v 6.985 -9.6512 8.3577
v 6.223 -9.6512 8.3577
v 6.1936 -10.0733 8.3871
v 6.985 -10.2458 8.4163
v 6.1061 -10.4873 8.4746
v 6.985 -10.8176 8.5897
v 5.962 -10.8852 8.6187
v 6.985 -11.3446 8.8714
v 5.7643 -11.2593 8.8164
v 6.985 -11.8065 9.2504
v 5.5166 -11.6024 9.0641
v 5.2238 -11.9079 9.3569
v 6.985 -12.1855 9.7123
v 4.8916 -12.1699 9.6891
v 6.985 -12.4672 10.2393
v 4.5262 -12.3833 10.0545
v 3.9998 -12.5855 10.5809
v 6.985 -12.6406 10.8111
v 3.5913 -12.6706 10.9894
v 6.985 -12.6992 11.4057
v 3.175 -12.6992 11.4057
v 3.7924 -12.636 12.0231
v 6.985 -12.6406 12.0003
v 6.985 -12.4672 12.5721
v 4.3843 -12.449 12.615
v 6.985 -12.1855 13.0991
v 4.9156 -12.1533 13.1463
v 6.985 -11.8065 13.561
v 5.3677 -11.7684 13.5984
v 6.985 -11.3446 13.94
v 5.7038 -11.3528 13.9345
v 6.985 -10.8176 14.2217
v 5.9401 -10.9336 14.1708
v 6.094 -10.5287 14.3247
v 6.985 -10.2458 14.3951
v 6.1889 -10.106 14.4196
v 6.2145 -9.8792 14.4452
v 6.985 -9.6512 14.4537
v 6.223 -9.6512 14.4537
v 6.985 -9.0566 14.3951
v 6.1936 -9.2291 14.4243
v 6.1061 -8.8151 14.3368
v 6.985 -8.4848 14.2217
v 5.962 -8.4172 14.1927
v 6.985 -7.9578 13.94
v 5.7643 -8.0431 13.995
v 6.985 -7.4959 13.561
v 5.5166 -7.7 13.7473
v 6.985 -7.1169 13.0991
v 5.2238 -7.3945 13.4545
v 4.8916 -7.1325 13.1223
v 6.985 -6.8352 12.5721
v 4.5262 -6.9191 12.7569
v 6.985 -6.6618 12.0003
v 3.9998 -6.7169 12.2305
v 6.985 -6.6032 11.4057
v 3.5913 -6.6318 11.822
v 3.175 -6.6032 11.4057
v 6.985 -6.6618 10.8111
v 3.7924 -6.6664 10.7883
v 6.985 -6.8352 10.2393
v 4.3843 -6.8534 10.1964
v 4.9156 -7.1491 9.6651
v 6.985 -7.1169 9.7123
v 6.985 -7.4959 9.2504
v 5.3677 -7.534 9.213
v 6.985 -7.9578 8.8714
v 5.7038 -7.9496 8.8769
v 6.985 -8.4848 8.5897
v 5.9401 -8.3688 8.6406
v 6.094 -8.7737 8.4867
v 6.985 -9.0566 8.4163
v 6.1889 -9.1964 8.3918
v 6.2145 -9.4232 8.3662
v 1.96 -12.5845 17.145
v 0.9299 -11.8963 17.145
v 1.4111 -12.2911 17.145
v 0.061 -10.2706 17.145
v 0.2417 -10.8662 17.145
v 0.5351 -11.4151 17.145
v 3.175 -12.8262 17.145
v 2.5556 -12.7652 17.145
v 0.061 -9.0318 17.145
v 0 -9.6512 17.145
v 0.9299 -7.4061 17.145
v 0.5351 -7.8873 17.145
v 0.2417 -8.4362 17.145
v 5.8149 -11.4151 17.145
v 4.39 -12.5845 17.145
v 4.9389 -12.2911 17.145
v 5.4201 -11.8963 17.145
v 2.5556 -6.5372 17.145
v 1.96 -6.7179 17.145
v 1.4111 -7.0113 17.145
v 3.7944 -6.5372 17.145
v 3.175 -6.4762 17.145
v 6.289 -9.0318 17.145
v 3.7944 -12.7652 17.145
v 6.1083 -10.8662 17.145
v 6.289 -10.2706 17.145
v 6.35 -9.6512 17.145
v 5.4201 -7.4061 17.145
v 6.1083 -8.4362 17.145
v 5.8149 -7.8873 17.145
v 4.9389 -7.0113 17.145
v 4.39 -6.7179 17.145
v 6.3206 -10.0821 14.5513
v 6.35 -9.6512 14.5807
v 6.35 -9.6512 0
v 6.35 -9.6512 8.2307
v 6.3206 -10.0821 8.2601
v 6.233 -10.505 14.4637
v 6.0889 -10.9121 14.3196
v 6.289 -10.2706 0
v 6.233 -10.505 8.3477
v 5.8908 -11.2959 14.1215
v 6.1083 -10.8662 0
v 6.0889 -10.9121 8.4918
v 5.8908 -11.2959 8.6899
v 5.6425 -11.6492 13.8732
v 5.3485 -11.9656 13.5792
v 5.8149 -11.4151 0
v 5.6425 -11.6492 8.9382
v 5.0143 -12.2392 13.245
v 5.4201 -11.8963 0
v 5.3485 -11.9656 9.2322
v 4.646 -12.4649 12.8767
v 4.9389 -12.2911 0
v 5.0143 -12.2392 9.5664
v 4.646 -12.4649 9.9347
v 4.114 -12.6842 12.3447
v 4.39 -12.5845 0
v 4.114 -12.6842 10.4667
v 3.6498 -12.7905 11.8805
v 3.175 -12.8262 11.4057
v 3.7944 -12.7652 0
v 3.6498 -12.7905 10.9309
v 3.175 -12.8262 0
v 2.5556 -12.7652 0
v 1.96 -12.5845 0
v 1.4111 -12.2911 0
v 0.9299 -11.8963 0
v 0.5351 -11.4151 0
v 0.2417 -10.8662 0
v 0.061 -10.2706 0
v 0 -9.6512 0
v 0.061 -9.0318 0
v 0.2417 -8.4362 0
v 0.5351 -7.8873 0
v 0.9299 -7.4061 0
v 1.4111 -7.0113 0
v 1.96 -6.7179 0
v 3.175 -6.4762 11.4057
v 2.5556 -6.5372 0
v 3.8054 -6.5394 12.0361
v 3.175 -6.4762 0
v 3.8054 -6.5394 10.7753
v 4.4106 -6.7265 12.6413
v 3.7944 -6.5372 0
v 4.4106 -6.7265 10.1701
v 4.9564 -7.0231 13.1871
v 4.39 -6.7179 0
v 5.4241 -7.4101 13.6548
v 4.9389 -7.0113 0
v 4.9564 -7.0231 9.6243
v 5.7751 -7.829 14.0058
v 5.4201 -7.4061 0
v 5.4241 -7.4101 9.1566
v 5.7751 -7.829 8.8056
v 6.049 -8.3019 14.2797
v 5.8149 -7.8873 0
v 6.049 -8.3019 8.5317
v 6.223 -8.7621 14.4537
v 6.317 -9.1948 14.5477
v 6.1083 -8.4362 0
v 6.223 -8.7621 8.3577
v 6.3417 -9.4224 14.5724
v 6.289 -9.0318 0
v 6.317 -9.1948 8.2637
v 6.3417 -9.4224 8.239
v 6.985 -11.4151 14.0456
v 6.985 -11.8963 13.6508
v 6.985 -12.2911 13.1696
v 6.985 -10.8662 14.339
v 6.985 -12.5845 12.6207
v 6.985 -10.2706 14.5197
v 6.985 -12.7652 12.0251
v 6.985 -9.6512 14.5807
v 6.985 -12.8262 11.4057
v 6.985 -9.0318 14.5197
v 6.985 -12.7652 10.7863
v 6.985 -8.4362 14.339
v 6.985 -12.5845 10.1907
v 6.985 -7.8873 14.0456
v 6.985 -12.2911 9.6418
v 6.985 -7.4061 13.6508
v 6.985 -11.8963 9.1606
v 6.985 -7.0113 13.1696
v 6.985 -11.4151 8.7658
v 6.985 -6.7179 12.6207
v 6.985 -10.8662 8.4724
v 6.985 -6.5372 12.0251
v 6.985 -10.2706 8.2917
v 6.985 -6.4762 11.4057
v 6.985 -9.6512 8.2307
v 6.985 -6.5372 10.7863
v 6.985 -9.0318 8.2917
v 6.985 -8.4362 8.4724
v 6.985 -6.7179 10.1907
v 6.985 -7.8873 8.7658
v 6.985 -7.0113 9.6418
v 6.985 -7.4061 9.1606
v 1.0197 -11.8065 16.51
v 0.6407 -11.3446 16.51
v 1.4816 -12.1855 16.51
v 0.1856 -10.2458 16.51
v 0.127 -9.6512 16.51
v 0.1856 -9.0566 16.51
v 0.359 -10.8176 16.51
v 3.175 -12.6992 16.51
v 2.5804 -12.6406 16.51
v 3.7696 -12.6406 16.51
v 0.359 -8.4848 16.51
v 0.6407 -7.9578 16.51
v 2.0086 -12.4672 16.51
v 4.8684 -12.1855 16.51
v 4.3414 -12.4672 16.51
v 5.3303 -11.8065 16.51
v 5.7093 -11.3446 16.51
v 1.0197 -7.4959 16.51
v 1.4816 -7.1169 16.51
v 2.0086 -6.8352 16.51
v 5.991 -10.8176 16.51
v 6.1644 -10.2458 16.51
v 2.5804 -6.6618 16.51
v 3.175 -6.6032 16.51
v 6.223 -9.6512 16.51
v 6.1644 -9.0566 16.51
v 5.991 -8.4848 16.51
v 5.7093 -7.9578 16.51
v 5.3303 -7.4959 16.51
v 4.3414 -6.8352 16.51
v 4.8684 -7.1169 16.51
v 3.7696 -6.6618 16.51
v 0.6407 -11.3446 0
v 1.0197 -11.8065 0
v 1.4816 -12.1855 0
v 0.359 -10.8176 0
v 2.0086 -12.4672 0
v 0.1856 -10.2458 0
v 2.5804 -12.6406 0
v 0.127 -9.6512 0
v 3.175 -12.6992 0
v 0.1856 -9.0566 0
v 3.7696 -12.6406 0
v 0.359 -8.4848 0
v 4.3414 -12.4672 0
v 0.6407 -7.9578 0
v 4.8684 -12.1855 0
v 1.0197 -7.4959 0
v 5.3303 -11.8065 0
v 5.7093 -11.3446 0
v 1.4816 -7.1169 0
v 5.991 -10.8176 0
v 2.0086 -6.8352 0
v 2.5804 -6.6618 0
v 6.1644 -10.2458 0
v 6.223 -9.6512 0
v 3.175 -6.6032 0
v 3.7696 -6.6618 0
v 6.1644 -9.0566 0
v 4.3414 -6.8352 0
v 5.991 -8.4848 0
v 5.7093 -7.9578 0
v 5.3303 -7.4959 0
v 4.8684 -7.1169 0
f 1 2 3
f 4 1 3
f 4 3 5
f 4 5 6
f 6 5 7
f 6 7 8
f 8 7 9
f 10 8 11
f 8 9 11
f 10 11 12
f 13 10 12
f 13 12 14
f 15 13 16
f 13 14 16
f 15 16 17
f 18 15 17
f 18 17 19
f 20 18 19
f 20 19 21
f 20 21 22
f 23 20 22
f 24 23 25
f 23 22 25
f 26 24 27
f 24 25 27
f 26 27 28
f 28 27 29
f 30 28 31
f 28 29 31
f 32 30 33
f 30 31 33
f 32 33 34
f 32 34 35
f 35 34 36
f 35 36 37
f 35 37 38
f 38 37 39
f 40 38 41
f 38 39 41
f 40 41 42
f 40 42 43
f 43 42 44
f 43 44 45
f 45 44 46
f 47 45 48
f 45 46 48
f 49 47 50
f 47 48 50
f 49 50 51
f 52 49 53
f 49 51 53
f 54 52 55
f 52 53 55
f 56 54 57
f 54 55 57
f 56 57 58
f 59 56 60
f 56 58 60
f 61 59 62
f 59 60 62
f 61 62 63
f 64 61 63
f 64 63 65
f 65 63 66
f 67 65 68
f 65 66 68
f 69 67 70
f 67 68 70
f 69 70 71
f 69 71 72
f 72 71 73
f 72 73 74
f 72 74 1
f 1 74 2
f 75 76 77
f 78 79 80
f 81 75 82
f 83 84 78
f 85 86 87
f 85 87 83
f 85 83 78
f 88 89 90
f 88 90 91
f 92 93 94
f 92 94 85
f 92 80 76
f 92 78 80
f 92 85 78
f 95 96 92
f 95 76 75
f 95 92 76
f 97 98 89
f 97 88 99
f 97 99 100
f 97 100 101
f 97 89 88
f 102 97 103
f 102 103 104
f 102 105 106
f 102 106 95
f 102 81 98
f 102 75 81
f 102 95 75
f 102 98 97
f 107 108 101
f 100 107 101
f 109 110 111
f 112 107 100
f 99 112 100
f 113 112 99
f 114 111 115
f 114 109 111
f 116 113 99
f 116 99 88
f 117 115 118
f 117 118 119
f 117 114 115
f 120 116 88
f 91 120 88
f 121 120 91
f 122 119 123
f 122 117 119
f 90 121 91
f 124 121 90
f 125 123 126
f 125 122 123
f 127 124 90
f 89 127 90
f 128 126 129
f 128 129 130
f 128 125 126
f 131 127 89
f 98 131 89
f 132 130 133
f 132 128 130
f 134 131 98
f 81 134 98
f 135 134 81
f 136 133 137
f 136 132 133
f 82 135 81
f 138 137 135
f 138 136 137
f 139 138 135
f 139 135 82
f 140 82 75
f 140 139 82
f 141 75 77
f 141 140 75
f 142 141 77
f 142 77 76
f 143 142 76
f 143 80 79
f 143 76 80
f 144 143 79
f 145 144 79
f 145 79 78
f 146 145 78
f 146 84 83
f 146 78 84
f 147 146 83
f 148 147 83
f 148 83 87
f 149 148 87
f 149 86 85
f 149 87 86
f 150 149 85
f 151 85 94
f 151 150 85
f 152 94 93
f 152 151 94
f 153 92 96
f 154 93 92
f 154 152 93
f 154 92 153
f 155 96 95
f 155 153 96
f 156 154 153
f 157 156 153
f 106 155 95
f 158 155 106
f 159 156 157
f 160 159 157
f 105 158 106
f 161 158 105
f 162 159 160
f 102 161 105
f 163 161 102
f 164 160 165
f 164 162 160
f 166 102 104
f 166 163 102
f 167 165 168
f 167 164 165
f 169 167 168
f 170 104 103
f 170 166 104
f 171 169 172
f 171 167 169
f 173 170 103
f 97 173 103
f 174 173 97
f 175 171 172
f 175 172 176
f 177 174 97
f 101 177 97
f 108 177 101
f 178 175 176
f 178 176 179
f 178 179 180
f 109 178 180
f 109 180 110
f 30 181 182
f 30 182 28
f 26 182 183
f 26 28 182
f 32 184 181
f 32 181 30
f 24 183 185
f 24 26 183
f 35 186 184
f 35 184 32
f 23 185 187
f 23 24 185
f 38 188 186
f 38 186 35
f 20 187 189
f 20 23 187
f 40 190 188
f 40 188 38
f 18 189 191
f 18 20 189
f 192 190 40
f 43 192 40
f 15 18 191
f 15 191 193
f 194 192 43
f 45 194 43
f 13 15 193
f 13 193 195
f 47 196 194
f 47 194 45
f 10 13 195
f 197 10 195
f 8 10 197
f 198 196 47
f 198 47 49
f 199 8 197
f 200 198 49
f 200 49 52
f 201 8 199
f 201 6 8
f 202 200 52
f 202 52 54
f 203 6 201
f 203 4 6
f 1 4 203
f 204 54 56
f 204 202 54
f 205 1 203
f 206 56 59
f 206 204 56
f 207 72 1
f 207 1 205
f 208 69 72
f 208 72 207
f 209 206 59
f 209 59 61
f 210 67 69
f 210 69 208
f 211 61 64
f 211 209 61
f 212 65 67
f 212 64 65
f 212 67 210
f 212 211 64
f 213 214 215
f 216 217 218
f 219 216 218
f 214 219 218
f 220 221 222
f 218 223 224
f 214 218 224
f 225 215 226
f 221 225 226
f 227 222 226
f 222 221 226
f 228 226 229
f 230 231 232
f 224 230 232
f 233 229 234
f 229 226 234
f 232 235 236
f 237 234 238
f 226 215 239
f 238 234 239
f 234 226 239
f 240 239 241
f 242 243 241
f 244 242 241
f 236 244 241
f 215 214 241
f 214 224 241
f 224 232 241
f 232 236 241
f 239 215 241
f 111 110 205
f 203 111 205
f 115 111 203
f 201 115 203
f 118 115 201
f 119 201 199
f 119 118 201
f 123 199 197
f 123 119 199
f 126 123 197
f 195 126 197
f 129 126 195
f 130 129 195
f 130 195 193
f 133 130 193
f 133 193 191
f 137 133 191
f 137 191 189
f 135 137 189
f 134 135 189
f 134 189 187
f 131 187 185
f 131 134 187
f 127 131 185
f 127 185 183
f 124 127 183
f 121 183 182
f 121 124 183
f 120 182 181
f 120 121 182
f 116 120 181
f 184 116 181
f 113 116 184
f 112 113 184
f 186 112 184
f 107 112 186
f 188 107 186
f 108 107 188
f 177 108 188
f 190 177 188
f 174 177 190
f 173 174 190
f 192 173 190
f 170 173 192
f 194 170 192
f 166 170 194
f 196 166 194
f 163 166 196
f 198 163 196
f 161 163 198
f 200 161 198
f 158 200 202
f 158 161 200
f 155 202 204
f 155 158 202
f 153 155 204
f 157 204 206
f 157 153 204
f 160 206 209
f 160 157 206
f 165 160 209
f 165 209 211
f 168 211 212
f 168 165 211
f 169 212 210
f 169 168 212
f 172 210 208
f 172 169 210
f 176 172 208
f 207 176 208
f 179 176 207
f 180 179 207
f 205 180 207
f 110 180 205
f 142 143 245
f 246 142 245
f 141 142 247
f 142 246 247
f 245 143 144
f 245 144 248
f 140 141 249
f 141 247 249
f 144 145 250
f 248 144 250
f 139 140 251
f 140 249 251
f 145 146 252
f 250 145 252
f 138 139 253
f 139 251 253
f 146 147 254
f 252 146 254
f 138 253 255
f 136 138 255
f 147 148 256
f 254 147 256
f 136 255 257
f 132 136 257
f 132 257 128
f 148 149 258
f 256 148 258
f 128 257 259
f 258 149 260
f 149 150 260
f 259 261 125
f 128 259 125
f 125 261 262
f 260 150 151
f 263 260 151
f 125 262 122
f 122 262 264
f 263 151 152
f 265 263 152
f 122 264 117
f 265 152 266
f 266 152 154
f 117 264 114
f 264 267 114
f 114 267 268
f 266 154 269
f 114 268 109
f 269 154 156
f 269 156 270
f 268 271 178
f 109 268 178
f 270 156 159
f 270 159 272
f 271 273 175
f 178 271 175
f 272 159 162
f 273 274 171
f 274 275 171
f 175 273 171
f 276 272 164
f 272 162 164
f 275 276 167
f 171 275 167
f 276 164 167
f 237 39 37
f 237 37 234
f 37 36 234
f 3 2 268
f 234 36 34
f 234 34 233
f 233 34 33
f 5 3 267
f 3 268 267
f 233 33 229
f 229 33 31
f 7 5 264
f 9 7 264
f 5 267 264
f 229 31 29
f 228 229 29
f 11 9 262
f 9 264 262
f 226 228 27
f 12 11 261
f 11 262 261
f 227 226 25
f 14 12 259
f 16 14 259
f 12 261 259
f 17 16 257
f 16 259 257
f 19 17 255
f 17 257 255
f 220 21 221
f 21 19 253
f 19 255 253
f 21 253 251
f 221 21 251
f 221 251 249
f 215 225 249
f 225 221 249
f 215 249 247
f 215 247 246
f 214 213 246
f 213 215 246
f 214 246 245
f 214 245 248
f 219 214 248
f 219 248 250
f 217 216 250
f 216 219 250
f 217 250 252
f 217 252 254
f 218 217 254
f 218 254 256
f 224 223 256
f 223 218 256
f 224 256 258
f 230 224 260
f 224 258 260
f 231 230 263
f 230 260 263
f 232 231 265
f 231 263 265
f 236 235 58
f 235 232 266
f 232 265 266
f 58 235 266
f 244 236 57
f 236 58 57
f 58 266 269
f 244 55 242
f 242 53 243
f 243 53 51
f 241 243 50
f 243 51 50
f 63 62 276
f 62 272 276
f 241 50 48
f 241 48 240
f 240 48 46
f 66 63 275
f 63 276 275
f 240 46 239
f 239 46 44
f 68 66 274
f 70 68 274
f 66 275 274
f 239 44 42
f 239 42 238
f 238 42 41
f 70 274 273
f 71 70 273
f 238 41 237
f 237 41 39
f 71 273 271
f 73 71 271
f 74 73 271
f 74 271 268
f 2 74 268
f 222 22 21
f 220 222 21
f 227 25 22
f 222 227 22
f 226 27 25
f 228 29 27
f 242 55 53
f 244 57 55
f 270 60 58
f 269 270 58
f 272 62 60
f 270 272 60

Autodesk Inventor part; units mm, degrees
ref_plane "YZ Plane" through (0, 0, 0) normal (1, 0, 0) x (0, 1, 0)
ref_plane "XZ Plane" through (0, 0, 0) normal (0, 1, 0) x (-1, 0, 0)
ref_plane "XY Plane" through (0, 0, 0) normal (0, 0, 1) x (1, 0, 0)
sketch "Sketch1" plane through (0, 0, 0) normal (0, 0, 1) x (1, 0, 0)
  circle A0 centre (3.175, -9.6512) radius 3.175 projected
  circle A1 centre (3.175, 9.6512) radius 3.175 projected
  circle A2 centre (3.175, -9.6512) radius 3.048
  point P0 (0, 0)
  dimension "d0" = 6.096
extrude "Extrusion1" add sketch "Sketch1" along normal blind 16.51 contours A0
ref_plane "Work Plane1" through (0, 0, 298.4246) normal (1, 0, 0) x (0, 0, 1)
sketch "Sketch2" plane through (0, 0, 298.4246) normal (1, 0, 0) x (0, 0, 1)
  point P0 (-298.4246, 0)
ref_plane "Work Plane2" through (6.985, -9.6512, 9.8182) normal (-1, 0, 0) x (0, 0, 1)
sketch "Sketch3" plane through (6.985, -9.6512, 9.8182) normal (-1, 0, 0) x (0, 0, 1)
  circle A0 centre (1.5875, 0) radius 3.175 projected
  circle A1 centre (1.5875, 0) radius 1.143 projected
  point P0 (-9.8182, 9.6512)
extrude "Extrusion2" cut sketch "Sketch3" along normal blind 3.81 contours A0 | A1
sketch "Sketch4" plane through (3.175, -9.6512, 9.8182) normal (1, 0, 0) x (0, 0, -1)
  arc A0 (-1.5875, 3.175) -> (-1.5875, -3.175) centre (-1.5875, 0) ccw projected
  circle A1 centre (-1.5875, 0) radius 3.175
  circle A2 centre (-1.5875, 0) radius 3.048
  point P0 (9.8182, 9.6512)
  dimension "d6" = 6.35
  dimension "d7" = 6.096
extrude "Extrusion3" add sketch "Sketch4" along normal blind 3.81
sketch "Sketch5" plane through (3.175, -9.6512, 9.8182) normal (-1, 0, 0) x (0, 0, 1)
  point P0 (-9.8182, 9.6512)
sketch "Sketch6" plane through (3.175, -9.6512, 16.51) normal (0, 0, 1) x (1, 0, 0)
  circle A0 centre (0, 0) radius 3.048 projected
  circle A1 centre (0, 0) radius 3.175 projected
  point P0 (-3.175, 9.6512)
extrude "Extrusion4" cut sketch "Sketch6" against normal through all contours A0
extrude "Extrusion5" add sketch "Sketch6" along normal blind 0.635 contours A0 | A1
properties part number "topwaterpipes"
